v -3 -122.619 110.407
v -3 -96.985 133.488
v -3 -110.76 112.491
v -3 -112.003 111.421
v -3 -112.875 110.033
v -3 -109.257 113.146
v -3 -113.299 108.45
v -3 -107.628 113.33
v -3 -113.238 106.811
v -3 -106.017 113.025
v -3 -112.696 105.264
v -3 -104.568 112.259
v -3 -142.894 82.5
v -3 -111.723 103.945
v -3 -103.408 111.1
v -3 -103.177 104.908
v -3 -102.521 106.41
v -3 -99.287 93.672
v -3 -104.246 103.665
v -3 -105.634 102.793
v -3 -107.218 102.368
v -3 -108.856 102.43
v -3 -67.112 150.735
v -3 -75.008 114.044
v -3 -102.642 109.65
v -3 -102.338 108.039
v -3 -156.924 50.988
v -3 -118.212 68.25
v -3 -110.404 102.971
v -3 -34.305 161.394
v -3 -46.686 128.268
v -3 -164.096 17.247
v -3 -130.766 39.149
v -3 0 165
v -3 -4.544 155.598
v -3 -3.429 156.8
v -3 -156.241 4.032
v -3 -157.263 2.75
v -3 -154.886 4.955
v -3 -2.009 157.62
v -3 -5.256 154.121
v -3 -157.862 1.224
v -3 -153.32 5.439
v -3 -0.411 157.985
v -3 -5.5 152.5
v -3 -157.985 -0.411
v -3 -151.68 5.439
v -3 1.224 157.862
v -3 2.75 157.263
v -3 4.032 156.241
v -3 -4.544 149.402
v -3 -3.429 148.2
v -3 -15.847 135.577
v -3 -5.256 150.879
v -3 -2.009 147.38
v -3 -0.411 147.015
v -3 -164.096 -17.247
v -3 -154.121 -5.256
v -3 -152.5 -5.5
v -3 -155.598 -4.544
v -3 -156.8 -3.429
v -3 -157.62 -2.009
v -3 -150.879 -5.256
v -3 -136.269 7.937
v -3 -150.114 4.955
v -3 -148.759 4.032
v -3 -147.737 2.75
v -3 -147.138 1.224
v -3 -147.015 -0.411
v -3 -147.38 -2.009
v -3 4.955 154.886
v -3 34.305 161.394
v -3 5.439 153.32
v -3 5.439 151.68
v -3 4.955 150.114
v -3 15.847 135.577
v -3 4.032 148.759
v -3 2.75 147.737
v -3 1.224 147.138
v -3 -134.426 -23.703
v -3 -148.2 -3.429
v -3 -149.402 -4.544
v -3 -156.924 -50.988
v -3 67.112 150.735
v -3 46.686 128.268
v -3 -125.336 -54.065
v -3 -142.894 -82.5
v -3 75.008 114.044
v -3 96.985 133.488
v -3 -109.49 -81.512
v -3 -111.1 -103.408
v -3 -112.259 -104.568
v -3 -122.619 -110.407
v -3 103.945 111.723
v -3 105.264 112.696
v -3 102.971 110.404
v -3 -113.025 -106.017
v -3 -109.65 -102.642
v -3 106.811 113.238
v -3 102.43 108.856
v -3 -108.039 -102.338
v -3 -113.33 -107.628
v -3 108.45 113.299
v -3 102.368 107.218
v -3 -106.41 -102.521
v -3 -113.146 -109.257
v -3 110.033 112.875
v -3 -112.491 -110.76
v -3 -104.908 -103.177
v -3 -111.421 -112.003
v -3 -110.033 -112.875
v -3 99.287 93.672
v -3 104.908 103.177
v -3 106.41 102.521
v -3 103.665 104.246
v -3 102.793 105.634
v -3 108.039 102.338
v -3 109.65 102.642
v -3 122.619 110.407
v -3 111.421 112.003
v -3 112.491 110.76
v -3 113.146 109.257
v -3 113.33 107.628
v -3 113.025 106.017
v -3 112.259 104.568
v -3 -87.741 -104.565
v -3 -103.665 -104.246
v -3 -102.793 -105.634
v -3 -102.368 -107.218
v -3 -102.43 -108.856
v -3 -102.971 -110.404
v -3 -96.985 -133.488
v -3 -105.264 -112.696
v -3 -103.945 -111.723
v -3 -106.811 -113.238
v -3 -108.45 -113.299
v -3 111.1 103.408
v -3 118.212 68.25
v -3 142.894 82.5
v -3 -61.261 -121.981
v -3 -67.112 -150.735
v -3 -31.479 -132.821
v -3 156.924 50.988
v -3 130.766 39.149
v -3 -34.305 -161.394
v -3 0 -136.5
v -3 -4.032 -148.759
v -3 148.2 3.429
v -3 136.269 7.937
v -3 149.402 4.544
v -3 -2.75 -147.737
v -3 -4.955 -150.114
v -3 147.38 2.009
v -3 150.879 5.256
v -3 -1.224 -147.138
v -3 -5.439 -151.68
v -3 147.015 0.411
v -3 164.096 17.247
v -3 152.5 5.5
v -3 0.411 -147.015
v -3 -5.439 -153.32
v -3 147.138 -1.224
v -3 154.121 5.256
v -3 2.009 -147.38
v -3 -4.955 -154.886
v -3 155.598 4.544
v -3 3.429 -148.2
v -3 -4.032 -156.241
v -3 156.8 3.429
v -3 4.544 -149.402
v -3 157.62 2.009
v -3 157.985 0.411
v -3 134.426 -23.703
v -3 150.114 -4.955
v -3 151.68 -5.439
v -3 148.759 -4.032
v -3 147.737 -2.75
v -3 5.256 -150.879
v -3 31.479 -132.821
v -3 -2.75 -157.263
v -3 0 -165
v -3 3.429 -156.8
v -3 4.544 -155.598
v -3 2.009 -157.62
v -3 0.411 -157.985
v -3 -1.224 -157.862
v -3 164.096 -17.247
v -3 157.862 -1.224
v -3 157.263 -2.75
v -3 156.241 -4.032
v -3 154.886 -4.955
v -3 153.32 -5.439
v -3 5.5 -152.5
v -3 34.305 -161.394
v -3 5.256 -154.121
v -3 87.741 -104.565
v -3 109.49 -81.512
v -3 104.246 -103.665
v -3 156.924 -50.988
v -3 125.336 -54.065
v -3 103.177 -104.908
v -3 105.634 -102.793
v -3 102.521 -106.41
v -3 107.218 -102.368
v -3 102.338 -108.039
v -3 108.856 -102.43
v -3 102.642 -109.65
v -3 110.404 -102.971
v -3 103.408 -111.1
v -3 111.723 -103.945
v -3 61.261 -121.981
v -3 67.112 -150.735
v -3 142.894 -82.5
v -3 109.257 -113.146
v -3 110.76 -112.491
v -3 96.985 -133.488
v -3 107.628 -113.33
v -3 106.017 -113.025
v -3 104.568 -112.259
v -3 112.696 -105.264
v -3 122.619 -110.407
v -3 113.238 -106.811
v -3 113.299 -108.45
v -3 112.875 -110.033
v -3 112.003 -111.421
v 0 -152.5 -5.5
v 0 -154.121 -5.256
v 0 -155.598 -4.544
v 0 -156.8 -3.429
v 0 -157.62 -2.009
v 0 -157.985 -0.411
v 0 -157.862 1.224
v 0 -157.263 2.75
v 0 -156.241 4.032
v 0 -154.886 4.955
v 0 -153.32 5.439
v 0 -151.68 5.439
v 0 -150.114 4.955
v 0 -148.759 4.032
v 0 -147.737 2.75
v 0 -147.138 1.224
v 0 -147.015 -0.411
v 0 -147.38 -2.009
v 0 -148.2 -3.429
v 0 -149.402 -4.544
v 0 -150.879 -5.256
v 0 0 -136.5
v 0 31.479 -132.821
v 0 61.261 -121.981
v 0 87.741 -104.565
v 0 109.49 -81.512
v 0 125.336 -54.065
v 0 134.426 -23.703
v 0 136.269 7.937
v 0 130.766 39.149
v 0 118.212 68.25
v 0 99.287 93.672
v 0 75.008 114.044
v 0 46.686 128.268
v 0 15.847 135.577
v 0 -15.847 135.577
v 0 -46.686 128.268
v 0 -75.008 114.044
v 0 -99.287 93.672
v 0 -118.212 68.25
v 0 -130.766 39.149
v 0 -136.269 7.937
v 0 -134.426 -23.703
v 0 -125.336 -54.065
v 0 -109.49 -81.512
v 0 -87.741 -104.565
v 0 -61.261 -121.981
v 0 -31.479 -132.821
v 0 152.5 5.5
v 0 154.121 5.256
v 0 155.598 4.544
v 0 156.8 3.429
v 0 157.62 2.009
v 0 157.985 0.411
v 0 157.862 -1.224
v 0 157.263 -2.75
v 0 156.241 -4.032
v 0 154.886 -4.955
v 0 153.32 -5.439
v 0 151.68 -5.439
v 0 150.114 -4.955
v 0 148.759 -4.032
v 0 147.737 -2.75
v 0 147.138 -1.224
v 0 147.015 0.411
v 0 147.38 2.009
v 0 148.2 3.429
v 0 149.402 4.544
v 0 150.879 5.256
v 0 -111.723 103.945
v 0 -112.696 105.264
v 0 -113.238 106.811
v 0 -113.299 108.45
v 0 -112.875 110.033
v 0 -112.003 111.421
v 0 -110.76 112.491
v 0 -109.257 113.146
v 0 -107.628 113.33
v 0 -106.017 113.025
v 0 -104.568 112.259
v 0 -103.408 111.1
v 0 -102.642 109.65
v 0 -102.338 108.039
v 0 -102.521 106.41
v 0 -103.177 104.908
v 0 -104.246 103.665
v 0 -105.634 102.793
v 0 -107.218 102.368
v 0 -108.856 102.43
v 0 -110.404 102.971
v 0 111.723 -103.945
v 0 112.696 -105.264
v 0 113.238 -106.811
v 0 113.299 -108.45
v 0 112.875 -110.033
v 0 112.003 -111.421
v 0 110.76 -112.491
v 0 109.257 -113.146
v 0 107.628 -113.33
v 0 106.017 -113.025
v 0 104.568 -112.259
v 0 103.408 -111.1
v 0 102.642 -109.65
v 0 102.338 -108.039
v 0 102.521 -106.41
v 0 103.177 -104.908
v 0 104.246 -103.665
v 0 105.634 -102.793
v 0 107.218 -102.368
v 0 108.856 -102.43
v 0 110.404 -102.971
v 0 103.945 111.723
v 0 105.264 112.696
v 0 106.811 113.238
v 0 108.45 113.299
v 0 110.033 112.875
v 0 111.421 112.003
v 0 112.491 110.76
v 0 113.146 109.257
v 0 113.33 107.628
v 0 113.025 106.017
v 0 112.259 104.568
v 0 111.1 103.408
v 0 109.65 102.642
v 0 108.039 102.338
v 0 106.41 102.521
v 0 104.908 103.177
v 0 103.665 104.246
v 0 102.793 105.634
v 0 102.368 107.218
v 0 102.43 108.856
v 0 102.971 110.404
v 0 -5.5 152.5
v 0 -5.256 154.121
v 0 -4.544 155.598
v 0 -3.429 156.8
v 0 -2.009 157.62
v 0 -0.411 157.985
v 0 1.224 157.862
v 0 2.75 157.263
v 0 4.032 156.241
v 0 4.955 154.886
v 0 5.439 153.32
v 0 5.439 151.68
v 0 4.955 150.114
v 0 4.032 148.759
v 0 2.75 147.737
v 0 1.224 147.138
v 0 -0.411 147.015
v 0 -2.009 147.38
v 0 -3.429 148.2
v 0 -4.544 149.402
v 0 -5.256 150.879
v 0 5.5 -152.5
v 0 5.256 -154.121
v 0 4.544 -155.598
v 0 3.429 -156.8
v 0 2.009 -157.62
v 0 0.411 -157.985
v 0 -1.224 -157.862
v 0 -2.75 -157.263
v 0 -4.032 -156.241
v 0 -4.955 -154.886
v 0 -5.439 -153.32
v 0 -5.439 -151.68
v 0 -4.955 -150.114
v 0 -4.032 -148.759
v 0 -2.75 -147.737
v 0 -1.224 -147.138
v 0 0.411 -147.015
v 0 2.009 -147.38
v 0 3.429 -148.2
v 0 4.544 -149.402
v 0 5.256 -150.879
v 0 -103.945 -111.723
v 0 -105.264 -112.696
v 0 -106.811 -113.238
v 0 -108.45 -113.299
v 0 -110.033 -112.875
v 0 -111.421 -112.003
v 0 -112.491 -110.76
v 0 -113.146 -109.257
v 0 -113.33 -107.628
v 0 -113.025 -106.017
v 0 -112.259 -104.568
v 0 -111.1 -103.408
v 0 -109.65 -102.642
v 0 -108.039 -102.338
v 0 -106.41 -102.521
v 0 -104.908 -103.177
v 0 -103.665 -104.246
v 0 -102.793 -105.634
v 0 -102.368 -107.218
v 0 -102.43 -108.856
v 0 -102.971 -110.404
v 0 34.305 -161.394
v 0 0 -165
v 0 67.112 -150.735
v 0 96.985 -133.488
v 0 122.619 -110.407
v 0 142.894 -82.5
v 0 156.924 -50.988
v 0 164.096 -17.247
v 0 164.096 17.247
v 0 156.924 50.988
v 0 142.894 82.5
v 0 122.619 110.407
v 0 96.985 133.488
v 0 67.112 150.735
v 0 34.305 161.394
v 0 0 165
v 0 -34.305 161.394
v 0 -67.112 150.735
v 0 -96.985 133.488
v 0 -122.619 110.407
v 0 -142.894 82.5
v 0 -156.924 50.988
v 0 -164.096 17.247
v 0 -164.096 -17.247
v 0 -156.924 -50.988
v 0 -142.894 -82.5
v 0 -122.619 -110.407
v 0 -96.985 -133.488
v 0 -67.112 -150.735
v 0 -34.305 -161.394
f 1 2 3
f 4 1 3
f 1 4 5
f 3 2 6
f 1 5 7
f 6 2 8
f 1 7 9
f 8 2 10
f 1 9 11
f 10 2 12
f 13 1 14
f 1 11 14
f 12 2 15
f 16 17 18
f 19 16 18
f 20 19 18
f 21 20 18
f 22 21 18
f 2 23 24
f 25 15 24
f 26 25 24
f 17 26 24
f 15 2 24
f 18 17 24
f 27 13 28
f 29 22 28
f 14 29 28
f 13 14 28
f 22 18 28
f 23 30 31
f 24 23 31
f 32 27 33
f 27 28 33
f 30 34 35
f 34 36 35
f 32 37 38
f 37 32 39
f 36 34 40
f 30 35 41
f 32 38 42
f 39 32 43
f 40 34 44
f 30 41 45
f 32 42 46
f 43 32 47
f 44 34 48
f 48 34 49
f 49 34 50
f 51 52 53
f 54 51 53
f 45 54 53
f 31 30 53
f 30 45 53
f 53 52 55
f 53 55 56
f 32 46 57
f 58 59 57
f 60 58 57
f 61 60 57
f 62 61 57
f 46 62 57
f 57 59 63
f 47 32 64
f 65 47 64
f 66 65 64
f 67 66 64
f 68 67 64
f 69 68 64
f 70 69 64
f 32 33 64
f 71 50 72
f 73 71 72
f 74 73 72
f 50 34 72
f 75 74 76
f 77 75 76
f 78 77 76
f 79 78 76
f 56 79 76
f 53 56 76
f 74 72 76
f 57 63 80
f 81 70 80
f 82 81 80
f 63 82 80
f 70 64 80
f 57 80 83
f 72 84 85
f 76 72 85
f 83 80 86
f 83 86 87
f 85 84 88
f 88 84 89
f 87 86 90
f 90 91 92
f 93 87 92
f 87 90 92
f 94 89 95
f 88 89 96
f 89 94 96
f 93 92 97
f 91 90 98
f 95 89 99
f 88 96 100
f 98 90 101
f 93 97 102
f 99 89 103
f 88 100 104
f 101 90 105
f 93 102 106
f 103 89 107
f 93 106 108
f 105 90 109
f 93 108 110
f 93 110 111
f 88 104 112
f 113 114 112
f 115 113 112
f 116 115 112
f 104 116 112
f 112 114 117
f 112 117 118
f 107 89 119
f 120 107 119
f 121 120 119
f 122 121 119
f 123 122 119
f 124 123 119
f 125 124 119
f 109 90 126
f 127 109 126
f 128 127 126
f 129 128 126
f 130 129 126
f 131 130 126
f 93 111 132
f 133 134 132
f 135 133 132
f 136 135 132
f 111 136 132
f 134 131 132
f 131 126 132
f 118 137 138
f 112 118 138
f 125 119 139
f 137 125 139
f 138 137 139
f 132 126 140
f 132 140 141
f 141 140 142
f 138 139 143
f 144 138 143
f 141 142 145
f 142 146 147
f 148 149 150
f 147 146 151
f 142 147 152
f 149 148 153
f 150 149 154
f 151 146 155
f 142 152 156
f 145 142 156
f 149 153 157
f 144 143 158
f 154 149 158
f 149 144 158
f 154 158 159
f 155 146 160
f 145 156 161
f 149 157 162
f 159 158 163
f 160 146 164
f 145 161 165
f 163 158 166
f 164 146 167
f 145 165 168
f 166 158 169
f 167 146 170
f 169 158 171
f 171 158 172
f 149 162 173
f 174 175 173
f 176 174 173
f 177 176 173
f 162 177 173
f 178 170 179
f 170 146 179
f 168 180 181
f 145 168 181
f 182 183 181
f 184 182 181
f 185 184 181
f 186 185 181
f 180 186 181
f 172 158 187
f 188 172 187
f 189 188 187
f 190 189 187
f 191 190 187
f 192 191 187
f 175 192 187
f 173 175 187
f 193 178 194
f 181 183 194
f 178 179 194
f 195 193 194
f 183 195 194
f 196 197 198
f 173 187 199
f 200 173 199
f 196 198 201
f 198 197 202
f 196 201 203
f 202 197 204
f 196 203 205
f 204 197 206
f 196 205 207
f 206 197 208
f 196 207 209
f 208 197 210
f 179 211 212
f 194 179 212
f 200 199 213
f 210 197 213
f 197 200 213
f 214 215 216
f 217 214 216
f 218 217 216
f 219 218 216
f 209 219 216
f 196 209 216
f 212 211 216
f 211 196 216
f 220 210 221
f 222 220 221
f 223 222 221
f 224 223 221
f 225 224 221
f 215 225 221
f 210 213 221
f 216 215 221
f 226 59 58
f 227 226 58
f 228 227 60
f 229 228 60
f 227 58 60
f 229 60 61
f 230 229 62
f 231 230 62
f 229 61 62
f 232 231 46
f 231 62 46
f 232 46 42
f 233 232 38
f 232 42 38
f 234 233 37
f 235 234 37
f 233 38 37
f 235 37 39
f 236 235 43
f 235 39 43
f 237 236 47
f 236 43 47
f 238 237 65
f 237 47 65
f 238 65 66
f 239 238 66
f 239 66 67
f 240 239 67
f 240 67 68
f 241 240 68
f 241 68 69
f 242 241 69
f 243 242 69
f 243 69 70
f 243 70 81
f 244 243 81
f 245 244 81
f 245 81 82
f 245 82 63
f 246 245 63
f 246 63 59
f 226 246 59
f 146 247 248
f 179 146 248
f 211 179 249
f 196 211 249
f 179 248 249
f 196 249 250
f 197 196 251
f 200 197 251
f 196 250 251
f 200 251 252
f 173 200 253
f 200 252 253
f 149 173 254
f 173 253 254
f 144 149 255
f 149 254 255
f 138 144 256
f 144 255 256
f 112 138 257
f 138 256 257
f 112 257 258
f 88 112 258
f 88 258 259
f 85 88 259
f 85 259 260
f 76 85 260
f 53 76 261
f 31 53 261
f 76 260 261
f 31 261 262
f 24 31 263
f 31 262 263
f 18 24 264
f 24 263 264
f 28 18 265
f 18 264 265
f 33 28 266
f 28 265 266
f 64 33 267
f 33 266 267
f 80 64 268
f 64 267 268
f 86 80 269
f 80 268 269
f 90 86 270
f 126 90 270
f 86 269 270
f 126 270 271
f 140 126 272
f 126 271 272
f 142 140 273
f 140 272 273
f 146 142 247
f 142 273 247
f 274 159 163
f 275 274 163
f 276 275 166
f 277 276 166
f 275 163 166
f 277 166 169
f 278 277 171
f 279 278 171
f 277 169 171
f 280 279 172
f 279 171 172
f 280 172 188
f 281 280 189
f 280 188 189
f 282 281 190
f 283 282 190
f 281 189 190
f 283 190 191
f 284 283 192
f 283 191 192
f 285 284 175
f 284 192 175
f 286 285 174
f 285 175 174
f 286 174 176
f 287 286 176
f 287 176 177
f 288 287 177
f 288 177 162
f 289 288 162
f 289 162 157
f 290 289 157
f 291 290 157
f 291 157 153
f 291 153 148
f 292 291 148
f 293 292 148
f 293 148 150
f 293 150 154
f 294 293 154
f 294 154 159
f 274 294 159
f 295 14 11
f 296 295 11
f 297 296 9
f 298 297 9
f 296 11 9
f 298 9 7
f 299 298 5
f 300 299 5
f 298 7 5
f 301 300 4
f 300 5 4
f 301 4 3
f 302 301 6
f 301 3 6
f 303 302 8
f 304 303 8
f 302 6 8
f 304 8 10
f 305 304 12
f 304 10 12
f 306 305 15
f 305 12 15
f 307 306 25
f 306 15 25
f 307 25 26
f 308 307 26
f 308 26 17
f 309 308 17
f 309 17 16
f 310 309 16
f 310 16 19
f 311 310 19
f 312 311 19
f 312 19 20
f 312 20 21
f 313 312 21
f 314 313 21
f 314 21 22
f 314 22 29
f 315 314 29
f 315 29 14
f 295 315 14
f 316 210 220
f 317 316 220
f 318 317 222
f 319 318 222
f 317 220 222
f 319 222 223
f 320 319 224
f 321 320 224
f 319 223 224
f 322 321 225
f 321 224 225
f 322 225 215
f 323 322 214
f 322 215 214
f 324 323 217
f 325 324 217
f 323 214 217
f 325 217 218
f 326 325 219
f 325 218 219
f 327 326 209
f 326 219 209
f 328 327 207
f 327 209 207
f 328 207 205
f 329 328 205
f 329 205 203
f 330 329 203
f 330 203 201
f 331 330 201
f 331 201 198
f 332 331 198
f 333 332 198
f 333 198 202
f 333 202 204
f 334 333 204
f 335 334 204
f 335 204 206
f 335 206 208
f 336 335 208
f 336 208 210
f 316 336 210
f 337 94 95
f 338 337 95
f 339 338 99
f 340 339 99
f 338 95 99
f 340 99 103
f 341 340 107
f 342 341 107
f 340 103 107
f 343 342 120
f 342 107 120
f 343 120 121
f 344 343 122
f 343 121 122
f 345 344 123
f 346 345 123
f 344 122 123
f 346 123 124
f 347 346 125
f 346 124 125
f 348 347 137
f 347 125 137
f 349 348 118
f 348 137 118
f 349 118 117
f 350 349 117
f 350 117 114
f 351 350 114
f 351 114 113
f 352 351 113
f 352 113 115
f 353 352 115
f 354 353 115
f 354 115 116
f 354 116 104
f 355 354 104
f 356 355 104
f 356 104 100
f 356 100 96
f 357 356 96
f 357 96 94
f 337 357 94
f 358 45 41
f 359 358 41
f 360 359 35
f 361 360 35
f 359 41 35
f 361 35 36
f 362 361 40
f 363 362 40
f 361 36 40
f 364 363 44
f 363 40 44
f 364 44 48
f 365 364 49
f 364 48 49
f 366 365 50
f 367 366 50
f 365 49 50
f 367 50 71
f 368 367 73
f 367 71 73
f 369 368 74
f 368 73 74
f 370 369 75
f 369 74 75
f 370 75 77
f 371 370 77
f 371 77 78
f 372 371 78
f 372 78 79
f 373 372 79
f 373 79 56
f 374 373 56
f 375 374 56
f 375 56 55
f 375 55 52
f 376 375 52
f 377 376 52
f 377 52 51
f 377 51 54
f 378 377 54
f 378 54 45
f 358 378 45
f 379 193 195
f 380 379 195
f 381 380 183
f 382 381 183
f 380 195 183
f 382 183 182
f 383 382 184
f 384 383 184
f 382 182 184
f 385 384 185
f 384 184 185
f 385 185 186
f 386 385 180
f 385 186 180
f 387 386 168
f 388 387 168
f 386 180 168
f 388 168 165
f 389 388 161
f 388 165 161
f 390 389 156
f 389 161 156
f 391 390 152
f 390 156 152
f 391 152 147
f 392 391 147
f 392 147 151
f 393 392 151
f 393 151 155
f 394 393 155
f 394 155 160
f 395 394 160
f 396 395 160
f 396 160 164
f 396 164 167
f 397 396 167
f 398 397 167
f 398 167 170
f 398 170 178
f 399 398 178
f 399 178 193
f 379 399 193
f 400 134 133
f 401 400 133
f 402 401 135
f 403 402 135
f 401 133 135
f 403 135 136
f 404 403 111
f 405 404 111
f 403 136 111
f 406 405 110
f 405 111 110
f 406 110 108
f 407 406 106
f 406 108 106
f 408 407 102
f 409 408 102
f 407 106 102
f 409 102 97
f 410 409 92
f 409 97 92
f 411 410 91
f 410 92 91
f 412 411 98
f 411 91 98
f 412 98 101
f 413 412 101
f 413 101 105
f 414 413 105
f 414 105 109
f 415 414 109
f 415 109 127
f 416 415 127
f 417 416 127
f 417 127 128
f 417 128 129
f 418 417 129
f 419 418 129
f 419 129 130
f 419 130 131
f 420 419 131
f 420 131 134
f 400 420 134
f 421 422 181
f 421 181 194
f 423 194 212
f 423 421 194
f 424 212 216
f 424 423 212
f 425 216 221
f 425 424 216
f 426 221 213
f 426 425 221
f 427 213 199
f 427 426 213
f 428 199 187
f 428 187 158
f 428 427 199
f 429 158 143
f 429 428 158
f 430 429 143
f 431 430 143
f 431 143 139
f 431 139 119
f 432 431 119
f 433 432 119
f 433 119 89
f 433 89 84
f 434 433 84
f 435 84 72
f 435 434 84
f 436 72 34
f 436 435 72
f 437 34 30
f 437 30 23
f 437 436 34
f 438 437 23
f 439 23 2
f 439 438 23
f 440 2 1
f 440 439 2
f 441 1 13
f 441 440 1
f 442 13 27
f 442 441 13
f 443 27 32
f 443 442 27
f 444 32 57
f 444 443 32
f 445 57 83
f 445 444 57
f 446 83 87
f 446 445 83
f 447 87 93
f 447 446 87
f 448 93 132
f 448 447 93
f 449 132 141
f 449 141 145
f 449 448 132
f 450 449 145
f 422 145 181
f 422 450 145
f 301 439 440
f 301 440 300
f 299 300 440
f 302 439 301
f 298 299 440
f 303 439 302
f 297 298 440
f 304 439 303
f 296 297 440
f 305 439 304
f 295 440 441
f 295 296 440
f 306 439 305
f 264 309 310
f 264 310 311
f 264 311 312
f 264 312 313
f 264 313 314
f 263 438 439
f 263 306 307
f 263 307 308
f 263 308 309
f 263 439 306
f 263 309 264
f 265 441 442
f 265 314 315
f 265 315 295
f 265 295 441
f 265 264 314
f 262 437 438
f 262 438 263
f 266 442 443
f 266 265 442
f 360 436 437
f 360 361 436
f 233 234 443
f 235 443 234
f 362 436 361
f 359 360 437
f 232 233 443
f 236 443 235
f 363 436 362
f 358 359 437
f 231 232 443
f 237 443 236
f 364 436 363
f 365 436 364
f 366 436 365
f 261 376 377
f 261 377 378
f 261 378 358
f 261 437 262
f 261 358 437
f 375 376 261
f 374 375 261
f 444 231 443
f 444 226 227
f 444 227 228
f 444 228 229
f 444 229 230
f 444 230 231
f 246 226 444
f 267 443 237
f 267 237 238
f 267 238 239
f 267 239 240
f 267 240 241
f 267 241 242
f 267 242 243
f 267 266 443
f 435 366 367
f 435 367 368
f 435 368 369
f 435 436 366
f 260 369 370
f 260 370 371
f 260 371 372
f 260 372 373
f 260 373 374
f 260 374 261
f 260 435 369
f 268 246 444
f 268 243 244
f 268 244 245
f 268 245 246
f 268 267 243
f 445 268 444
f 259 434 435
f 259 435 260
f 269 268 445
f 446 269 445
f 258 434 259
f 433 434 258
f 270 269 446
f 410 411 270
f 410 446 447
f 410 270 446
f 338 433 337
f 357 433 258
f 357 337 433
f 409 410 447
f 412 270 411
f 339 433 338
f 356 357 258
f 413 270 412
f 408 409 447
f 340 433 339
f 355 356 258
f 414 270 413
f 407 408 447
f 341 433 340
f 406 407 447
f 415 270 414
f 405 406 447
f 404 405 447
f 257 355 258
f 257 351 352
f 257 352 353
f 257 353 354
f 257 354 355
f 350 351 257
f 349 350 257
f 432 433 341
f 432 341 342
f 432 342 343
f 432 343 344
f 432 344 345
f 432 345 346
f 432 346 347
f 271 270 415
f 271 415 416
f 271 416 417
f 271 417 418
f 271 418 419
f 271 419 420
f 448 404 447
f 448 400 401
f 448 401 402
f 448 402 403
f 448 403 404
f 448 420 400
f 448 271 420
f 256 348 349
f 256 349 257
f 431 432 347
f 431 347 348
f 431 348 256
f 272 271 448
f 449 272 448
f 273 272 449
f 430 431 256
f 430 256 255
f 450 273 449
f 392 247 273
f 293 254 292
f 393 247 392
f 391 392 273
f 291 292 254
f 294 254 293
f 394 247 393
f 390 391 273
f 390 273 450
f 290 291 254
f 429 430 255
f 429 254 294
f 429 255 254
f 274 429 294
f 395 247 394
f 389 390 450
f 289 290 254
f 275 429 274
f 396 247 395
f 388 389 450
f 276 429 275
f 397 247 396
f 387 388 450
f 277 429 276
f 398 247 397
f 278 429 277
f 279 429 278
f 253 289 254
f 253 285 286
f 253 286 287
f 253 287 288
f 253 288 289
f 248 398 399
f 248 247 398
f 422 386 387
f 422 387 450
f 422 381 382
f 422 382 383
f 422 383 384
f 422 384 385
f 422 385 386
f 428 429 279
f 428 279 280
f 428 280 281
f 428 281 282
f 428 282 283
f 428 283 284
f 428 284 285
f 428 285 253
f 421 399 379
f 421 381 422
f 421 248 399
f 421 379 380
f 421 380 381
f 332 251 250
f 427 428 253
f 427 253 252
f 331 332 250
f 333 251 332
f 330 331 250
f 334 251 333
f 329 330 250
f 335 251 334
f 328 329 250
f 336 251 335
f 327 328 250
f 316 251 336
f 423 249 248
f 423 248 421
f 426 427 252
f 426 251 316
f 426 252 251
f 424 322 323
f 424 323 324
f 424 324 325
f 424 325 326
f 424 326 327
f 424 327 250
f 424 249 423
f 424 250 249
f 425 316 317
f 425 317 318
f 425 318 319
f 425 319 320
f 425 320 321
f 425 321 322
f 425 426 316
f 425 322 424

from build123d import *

# Parameters (mm, degrees)
SKIZZE2_R                       = 165
SKIZZE2_R_2                     = 136.5
AUFSATZ_LINEAR_AUSTRAGEN1_DEPTH = 3
DURCHGANGSLOCH_F_R_M101_D       = 11
KREISMUSTER1_COUNT              = 8


with BuildPart() as part:
    # Skizze2 → Aufsatz-Linear austragen1 (new body)
    with BuildSketch(Plane(origin=(0, 0, 0), x_dir=(0, 0, -1), z_dir=(1, 0, 0))):
        Circle(SKIZZE2_R)
        Circle(SKIZZE2_R_2, mode=Mode.SUBTRACT)
    extrude(amount=-AUFSATZ_LINEAR_AUSTRAGEN1_DEPTH)

    # Durchgangsloch für M101 (through all)
    with Locations(Plane(origin=(0, -26.503392929, -77.586576954), x_dir=(0, 0, -1), z_dir=(1, 0, 0))):
        with Locations((-77.586576954, 179.003392929)):
            durchgangsloch_f_r_m101 = Hole(DURCHGANGSLOCH_F_R_M101_D / 2)

    # Kreismuster1: Durchgangsloch für M101 ×8 about axis
    kreismuster1_axis = Axis((0, 0, 0), (1, 0, 0))
    for i in range(1, KREISMUSTER1_COUNT):
        add(durchgangsloch_f_r_m101.rotate(kreismuster1_axis, i * 360 / KREISMUSTER1_COUNT), mode=Mode.SUBTRACT)


solid = part.part
